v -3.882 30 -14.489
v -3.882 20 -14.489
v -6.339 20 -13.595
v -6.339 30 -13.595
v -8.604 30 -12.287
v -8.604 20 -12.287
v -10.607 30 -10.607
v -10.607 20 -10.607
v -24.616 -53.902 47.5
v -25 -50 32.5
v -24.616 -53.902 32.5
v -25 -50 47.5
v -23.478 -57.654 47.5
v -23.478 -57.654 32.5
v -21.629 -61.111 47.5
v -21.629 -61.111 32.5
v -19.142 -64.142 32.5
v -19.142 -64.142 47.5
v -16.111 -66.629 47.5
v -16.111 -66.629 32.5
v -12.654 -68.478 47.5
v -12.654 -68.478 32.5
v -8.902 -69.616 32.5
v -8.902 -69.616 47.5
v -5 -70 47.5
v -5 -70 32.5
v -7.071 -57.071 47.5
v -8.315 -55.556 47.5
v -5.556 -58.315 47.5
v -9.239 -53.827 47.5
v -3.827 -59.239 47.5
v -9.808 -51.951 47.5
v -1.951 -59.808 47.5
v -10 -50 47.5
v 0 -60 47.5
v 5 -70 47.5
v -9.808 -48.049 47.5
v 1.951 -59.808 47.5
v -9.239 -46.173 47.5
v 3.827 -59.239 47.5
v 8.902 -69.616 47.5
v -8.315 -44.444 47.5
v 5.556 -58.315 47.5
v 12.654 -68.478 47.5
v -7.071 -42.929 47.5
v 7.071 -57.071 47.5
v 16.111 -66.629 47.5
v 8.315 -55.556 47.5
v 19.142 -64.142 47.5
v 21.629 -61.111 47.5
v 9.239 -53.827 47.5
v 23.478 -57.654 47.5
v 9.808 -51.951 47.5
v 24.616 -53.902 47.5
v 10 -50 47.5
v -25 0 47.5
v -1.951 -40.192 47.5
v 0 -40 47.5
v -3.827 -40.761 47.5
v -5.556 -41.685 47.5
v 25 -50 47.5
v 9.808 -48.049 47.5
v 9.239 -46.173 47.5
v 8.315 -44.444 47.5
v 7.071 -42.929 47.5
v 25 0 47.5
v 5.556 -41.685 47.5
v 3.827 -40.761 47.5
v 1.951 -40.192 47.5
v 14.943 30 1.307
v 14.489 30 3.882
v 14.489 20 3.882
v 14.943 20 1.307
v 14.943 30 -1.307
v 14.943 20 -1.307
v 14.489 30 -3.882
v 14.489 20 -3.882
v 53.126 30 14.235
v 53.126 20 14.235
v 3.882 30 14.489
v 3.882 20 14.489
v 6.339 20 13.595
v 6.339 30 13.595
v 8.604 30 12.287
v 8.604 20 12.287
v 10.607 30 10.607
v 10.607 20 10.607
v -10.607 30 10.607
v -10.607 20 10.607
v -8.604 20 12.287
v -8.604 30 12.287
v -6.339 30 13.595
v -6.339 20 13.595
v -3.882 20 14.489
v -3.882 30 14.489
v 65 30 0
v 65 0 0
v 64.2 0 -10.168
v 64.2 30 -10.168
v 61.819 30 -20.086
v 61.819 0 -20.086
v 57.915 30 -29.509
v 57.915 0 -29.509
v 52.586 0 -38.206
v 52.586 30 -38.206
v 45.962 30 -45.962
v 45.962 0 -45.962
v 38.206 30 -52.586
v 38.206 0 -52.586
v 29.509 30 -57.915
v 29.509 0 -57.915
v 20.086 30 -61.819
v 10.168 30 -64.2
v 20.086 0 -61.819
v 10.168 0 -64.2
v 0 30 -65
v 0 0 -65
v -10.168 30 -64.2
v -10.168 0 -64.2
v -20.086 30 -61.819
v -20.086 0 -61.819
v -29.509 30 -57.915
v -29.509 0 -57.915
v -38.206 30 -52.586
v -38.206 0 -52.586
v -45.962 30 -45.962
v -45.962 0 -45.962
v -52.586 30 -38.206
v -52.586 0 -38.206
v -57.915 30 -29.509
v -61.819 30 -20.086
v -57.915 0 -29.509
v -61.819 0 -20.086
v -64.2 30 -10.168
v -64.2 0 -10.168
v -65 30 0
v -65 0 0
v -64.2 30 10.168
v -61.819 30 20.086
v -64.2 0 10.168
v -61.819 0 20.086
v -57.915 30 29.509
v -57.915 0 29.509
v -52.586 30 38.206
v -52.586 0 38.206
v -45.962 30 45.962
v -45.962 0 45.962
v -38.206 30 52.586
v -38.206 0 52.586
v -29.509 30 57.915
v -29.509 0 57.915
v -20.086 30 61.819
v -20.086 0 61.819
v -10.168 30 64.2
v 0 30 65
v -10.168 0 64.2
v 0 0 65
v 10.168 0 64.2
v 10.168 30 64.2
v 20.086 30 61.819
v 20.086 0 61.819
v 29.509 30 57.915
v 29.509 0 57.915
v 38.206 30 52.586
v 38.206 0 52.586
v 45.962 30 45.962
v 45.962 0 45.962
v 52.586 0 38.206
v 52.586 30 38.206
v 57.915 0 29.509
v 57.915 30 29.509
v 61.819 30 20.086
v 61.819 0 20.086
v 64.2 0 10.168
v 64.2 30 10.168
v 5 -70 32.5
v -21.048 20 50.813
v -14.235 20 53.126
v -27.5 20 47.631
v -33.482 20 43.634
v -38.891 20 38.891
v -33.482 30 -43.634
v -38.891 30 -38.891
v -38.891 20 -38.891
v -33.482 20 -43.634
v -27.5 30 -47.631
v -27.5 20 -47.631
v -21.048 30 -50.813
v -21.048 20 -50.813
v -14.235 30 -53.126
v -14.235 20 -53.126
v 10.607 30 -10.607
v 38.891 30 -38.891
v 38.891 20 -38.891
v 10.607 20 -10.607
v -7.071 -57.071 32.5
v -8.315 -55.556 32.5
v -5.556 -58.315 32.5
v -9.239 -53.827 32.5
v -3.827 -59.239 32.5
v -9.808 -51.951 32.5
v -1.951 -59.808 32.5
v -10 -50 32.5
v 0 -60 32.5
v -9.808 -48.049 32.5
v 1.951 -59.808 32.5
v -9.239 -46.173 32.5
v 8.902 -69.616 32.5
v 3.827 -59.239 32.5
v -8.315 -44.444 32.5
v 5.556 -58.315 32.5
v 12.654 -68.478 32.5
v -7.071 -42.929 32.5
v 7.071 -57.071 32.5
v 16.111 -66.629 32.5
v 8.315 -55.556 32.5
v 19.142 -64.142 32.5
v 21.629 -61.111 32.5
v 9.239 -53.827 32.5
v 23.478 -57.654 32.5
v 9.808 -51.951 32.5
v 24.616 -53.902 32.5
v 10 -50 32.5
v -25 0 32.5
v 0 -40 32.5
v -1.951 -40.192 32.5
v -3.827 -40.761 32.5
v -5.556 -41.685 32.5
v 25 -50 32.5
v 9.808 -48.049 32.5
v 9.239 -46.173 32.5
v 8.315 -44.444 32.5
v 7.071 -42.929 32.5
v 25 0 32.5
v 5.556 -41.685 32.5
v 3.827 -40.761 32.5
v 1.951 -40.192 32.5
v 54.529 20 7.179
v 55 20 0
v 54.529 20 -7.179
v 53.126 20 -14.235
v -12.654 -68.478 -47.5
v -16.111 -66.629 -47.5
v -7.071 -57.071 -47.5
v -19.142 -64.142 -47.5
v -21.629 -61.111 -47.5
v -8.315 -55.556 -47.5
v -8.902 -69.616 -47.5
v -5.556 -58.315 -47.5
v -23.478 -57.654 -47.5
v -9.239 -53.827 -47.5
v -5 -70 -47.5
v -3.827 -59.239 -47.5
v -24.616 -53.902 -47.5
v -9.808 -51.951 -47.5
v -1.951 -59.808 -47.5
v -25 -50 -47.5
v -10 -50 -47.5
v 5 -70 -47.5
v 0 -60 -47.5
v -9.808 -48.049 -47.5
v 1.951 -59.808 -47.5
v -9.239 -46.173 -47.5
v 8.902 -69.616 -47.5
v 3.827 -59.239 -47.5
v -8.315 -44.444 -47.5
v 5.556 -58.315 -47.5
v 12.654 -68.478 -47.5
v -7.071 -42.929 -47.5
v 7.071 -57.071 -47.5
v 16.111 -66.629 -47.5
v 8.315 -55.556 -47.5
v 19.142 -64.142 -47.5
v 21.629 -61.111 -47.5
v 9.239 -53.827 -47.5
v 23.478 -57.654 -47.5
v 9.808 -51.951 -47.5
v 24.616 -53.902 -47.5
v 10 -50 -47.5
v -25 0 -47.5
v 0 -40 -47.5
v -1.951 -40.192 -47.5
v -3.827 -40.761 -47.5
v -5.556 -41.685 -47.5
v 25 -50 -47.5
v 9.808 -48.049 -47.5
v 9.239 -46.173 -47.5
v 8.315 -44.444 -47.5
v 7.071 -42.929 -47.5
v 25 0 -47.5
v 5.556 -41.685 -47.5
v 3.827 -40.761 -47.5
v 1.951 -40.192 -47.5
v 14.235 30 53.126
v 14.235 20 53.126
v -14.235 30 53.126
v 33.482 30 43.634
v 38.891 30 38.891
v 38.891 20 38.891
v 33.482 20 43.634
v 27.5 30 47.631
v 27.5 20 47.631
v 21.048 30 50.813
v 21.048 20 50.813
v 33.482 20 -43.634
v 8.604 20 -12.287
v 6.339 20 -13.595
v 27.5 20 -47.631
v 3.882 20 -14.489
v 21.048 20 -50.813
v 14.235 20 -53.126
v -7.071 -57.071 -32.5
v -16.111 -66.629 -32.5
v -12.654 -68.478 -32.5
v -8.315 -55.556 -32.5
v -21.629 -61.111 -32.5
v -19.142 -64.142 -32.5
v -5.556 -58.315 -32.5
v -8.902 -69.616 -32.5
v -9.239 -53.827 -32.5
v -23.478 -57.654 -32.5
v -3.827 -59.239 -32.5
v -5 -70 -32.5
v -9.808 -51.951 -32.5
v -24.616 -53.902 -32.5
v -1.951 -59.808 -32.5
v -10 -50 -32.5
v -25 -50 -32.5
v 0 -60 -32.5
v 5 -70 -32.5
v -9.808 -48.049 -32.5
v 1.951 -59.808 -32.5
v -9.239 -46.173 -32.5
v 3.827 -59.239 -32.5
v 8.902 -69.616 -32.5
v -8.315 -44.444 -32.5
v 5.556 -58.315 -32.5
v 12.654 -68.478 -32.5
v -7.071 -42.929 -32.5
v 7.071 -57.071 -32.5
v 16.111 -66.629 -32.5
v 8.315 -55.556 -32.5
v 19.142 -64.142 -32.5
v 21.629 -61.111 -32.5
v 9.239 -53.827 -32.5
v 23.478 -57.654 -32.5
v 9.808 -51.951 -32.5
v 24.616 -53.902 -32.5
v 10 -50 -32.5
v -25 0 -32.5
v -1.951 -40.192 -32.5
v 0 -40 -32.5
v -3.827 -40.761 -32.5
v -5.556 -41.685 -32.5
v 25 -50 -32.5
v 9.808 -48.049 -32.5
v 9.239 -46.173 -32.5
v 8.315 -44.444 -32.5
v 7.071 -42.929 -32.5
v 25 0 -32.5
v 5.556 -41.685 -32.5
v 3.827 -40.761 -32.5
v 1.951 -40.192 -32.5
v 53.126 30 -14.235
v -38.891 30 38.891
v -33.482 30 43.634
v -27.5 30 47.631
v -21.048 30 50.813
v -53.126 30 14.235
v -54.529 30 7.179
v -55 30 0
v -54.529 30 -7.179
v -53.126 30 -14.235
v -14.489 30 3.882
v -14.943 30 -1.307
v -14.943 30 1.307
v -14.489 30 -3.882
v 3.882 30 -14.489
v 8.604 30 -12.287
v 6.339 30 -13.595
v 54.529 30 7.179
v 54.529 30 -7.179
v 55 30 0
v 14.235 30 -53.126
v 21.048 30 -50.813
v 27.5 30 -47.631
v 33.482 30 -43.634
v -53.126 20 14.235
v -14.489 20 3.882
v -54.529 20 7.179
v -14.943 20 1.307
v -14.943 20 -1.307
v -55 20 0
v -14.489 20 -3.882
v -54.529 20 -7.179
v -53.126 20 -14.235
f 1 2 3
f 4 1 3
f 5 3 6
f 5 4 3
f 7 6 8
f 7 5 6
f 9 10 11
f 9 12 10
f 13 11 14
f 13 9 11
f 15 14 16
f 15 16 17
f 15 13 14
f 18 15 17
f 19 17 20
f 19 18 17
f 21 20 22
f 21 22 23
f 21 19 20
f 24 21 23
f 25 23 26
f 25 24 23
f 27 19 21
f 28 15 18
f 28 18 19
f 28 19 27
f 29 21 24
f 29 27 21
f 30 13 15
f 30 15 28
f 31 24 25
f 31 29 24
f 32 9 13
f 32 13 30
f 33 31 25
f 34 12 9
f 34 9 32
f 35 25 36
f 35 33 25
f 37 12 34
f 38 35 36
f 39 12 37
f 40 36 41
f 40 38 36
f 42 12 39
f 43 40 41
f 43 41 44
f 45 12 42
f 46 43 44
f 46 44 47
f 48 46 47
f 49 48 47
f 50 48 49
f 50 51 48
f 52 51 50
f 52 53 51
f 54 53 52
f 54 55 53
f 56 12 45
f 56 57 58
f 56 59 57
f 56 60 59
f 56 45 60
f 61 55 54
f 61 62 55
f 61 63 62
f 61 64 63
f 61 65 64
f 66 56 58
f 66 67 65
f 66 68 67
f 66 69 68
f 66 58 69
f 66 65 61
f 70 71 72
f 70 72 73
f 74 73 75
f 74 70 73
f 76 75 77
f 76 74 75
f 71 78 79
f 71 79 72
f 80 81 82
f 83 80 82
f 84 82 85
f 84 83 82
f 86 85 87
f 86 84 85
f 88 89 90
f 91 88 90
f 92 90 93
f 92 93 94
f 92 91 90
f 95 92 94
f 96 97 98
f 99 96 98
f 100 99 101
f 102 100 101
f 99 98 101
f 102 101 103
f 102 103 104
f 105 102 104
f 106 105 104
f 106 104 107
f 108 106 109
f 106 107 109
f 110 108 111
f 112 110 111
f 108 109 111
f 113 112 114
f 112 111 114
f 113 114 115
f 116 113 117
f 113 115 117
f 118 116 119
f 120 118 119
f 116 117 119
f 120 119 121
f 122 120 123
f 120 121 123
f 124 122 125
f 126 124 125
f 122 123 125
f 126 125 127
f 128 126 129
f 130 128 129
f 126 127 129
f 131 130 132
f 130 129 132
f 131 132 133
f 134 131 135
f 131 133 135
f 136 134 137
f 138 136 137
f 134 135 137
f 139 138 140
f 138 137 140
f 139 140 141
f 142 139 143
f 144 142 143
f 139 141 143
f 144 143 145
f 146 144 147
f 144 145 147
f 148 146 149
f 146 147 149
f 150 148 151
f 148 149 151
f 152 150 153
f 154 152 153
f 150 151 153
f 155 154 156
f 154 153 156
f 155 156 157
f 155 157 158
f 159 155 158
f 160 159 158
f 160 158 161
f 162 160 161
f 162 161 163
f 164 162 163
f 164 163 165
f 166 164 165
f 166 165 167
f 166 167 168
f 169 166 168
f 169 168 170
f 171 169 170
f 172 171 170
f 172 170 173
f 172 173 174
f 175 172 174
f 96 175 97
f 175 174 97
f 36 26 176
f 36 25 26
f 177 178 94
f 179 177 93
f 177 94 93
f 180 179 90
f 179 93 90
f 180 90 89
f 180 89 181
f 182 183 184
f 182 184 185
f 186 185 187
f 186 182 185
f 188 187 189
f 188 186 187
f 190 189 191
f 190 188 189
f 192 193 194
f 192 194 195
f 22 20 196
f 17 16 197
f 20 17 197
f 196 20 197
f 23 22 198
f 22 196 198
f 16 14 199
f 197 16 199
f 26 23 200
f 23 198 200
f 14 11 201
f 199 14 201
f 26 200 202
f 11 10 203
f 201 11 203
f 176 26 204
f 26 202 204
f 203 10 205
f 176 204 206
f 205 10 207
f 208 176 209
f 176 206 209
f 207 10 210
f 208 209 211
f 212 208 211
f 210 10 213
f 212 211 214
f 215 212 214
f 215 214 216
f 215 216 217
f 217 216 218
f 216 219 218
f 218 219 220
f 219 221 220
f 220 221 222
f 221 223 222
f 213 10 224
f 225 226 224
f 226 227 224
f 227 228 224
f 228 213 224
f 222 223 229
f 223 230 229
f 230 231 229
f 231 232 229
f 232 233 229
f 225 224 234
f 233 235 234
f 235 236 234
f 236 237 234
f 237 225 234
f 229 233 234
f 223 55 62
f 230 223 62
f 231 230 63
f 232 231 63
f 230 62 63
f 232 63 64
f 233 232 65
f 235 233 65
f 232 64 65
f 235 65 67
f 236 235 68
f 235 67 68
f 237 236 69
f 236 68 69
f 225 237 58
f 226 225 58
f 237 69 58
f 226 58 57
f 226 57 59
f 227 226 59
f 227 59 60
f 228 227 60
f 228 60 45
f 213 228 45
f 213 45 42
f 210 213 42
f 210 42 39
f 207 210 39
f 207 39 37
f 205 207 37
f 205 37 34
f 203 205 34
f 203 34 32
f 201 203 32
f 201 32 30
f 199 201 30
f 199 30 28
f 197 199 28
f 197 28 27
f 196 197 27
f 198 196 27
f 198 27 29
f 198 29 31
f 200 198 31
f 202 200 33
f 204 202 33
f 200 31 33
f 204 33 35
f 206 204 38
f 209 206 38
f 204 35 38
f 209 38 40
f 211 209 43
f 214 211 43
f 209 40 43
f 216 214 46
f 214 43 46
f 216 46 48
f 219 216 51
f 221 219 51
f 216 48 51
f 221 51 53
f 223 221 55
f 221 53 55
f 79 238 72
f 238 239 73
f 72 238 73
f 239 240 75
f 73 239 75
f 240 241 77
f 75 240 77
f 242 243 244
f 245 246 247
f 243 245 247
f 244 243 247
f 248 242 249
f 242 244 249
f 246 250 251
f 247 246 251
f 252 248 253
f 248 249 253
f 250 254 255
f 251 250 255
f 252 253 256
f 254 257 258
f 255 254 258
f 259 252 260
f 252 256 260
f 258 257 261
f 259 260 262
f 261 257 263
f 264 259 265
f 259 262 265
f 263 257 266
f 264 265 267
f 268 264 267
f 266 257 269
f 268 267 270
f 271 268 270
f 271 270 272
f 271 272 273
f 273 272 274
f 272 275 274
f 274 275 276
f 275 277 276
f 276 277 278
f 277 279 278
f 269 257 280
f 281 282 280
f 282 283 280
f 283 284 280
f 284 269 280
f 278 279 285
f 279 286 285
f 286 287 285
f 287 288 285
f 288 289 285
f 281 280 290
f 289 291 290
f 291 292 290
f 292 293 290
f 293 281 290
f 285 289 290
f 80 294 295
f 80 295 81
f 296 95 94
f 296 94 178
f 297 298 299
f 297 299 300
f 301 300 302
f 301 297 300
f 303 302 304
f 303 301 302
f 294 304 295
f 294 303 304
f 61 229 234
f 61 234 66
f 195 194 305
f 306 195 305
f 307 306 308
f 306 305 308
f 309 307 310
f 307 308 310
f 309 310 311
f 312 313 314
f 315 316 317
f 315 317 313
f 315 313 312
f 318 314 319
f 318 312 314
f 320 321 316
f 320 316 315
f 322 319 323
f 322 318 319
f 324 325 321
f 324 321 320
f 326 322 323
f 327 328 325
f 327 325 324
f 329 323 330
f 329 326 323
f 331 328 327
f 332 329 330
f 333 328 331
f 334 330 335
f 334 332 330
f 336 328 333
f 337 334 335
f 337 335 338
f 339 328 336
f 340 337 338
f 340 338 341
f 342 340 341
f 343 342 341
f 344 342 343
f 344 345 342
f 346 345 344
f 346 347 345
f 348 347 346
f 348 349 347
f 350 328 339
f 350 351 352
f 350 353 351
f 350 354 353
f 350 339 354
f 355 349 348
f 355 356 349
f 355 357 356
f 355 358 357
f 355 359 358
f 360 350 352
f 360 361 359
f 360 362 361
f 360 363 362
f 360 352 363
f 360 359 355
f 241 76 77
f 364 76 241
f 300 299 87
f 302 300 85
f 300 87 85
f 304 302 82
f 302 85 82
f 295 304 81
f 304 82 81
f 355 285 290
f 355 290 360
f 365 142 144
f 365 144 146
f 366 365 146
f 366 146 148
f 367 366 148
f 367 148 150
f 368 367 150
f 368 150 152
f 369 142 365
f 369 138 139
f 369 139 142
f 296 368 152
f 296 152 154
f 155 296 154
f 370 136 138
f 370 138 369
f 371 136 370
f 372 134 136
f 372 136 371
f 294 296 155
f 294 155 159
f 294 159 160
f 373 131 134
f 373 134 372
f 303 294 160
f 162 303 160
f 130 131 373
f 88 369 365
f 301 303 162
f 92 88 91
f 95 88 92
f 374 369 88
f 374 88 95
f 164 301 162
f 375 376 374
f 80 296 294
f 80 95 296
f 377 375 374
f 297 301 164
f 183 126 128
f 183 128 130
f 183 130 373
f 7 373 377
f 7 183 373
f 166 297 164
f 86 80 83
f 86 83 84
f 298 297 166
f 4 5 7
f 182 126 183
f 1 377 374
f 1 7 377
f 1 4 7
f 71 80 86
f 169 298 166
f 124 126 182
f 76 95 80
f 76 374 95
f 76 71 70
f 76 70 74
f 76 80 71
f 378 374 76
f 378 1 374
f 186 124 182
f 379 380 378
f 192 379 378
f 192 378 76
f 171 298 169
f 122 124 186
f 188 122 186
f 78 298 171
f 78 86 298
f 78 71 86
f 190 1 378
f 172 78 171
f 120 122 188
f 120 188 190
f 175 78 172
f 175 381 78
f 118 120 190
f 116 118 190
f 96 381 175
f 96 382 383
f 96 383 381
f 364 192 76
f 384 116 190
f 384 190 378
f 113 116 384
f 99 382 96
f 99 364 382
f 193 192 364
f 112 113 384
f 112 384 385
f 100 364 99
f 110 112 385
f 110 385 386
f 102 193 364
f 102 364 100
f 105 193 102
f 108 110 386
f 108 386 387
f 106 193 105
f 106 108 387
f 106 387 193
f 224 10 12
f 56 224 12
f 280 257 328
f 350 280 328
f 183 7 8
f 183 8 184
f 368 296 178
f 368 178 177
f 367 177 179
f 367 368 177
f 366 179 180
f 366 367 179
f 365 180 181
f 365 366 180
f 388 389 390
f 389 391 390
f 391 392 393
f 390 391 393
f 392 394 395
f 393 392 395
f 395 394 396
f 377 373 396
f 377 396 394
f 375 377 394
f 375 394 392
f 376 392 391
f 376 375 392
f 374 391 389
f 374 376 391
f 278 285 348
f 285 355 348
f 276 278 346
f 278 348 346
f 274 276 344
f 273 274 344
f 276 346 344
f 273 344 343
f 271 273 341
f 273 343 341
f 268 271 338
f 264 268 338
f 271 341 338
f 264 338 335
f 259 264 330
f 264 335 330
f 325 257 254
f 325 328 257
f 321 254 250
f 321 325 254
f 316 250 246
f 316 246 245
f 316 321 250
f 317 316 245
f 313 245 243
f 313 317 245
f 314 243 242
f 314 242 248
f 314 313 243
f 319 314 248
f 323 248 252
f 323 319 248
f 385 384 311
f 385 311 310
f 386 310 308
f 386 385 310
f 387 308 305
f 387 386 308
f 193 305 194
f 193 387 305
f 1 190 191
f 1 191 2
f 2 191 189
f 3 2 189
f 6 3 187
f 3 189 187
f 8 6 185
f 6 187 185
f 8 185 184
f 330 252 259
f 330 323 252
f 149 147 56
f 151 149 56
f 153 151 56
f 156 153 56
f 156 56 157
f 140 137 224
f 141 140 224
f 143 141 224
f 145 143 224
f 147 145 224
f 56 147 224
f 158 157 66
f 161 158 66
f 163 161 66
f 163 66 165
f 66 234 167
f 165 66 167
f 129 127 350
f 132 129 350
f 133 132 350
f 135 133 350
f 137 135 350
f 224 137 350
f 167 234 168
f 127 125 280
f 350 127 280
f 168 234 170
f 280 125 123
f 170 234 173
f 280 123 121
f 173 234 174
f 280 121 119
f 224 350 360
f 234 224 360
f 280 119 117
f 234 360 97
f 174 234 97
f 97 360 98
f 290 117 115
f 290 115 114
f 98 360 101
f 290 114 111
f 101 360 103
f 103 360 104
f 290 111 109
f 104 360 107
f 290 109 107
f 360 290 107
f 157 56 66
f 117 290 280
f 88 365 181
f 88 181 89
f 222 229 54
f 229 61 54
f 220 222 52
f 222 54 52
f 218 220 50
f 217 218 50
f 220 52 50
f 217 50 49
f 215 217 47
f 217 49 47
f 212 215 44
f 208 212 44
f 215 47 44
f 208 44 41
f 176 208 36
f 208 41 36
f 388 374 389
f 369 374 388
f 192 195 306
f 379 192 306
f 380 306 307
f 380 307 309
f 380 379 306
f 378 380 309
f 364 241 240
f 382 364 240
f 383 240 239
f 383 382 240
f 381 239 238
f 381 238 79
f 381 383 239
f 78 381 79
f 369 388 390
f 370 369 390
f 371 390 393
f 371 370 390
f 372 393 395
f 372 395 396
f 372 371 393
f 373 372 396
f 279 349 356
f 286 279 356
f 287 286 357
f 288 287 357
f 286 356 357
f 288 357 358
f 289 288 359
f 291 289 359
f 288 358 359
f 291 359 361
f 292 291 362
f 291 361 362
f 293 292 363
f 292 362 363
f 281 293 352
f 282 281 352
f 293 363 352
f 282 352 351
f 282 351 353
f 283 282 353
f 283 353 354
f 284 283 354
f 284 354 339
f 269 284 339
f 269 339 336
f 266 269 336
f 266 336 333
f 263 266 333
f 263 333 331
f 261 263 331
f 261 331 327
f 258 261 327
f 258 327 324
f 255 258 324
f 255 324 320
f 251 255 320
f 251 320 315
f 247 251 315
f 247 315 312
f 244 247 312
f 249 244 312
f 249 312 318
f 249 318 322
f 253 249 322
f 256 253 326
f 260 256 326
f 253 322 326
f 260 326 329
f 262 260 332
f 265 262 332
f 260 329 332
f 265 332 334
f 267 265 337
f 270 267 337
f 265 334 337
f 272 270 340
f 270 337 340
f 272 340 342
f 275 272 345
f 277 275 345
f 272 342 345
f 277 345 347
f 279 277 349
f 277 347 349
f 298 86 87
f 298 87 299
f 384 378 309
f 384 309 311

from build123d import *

# Parameters (mm, degrees)
SKETCH_1_R          = 65
EXTRUDE_1_DEPTH     = 30
SKETCH_2_W          = 50
SKETCH_2_H          = 15
EXTRUDE_2_DEPTH     = 70
FILLET_2_R          = 20
SKETCH_3_R          = 10
CUT_EXTRUDE_1_DEPTH = 113.5
CUT_EXTRUDE_2_DEPTH = 10


with BuildPart() as part:
    # 草图1 → 凸台-拉伸1 (new body)
    with BuildSketch(Plane(origin=(0, 0, 0), x_dir=(1, 0, 0), z_dir=(0, 1, 0))):
        Circle(SKETCH_1_R)
    extrude(amount=EXTRUDE_1_DEPTH)

    # 草图2 → 凸台-拉伸2 (add)
    with BuildSketch(Plane.XZ):
        with Locations((0, 40)):
            Rectangle(SKETCH_2_W, SKETCH_2_H)
        with Locations((0, -40)):
            Rectangle(SKETCH_2_W, SKETCH_2_H)
    extrude(amount=EXTRUDE_2_DEPTH)

    # 圆角2
    fillet_2_edges = [part.edges().sort_by_distance(p)[0] for p in [
        (25, -70, 40),
        (-25, -70, 40),
        (-25, -70, -40),
        (25, -70, -40),
    ]]
    fillet(fillet_2_edges, radius=FILLET_2_R)

    # 草图3 → 切除-拉伸1 (cut, through all)
    with BuildSketch(Plane.XY.offset(47.5)):
        with Locations((0, -50)):
            Circle(SKETCH_3_R)
    extrude(amount=-CUT_EXTRUDE_1_DEPTH, mode=Mode.SUBTRACT)

    # 草图7 → 切除-拉伸2 (cut)
    with BuildSketch(Plane(origin=(0, 30, 0), x_dir=(1, 0, 0), z_dir=(0, 1, 0))):
        with BuildLine():
            Line((14.488887394, 3.882285677), (53.125920446, 14.235047481))
            ThreePointArc((53.125920446, 14.235047481), (55, 0), (53.125920446, -14.235047481))
            Line((53.125920446, -14.235047481), (14.488887394, -3.882285677))
            ThreePointArc((14.488887394, -3.882285677), (15, 0), (14.488887394, 3.882285677))
        make_face()
        with BuildLine():
            Line((10.606601718, -10.606601718), (38.890872965, -38.890872965))
            ThreePointArc((38.890872965, -38.890872965), (27.5, -47.631397208), (14.235047481, -53.125920446))
            Line((14.235047481, -53.125920446), (3.882285677, -14.488887394))
            ThreePointArc((3.882285677, -14.488887394), (7.5, -12.990381057), (10.606601718, -10.606601718))
        make_face()
        with BuildLine():
            Line((-3.882285677, -14.488887394), (-14.235047481, -53.125920446))
            ThreePointArc((-14.235047481, -53.125920446), (-27.5, -47.631397208), (-38.890872965, -38.890872965))
            Line((-38.890872965, -38.890872965), (-10.606601718, -10.606601718))
            ThreePointArc((-10.606601718, -10.606601718), (-7.5, -12.990381057), (-3.882285677, -14.488887394))
        make_face()
        with BuildLine():
            Line((-14.488887394, -3.882285677), (-53.125920446, -14.235047481))
            ThreePointArc((-53.125920446, -14.235047481), (-55, 0), (-53.125920446, 14.235047481))
            Line((-53.125920446, 14.235047481), (-14.488887394, 3.882285677))
            ThreePointArc((-14.488887394, 3.882285677), (-15, 0), (-14.488887394, -3.882285677))
        make_face()
        with BuildLine():
            Line((-10.606601718, 10.606601718), (-38.890872965, 38.890872965))
            ThreePointArc((-38.890872965, 38.890872965), (-27.5, 47.631397208), (-14.235047481, 53.125920446))
            Line((-14.235047481, 53.125920446), (-3.882285677, 14.488887394))
            ThreePointArc((-3.882285677, 14.488887394), (-7.5, 12.990381057), (-10.606601718, 10.606601718))
        make_face()
        with BuildLine():
            Line((3.882285677, 14.488887394), (14.235047481, 53.125920446))
            ThreePointArc((14.235047481, 53.125920446), (27.5, 47.631397208), (38.890872965, 38.890872965))
            Line((38.890872965, 38.890872965), (10.606601718, 10.606601718))
            ThreePointArc((10.606601718, 10.606601718), (7.5, 12.990381057), (3.882285677, 14.488887394))
        make_face()
    extrude(amount=-CUT_EXTRUDE_2_DEPTH, mode=Mode.SUBTRACT)


solid = part.part
